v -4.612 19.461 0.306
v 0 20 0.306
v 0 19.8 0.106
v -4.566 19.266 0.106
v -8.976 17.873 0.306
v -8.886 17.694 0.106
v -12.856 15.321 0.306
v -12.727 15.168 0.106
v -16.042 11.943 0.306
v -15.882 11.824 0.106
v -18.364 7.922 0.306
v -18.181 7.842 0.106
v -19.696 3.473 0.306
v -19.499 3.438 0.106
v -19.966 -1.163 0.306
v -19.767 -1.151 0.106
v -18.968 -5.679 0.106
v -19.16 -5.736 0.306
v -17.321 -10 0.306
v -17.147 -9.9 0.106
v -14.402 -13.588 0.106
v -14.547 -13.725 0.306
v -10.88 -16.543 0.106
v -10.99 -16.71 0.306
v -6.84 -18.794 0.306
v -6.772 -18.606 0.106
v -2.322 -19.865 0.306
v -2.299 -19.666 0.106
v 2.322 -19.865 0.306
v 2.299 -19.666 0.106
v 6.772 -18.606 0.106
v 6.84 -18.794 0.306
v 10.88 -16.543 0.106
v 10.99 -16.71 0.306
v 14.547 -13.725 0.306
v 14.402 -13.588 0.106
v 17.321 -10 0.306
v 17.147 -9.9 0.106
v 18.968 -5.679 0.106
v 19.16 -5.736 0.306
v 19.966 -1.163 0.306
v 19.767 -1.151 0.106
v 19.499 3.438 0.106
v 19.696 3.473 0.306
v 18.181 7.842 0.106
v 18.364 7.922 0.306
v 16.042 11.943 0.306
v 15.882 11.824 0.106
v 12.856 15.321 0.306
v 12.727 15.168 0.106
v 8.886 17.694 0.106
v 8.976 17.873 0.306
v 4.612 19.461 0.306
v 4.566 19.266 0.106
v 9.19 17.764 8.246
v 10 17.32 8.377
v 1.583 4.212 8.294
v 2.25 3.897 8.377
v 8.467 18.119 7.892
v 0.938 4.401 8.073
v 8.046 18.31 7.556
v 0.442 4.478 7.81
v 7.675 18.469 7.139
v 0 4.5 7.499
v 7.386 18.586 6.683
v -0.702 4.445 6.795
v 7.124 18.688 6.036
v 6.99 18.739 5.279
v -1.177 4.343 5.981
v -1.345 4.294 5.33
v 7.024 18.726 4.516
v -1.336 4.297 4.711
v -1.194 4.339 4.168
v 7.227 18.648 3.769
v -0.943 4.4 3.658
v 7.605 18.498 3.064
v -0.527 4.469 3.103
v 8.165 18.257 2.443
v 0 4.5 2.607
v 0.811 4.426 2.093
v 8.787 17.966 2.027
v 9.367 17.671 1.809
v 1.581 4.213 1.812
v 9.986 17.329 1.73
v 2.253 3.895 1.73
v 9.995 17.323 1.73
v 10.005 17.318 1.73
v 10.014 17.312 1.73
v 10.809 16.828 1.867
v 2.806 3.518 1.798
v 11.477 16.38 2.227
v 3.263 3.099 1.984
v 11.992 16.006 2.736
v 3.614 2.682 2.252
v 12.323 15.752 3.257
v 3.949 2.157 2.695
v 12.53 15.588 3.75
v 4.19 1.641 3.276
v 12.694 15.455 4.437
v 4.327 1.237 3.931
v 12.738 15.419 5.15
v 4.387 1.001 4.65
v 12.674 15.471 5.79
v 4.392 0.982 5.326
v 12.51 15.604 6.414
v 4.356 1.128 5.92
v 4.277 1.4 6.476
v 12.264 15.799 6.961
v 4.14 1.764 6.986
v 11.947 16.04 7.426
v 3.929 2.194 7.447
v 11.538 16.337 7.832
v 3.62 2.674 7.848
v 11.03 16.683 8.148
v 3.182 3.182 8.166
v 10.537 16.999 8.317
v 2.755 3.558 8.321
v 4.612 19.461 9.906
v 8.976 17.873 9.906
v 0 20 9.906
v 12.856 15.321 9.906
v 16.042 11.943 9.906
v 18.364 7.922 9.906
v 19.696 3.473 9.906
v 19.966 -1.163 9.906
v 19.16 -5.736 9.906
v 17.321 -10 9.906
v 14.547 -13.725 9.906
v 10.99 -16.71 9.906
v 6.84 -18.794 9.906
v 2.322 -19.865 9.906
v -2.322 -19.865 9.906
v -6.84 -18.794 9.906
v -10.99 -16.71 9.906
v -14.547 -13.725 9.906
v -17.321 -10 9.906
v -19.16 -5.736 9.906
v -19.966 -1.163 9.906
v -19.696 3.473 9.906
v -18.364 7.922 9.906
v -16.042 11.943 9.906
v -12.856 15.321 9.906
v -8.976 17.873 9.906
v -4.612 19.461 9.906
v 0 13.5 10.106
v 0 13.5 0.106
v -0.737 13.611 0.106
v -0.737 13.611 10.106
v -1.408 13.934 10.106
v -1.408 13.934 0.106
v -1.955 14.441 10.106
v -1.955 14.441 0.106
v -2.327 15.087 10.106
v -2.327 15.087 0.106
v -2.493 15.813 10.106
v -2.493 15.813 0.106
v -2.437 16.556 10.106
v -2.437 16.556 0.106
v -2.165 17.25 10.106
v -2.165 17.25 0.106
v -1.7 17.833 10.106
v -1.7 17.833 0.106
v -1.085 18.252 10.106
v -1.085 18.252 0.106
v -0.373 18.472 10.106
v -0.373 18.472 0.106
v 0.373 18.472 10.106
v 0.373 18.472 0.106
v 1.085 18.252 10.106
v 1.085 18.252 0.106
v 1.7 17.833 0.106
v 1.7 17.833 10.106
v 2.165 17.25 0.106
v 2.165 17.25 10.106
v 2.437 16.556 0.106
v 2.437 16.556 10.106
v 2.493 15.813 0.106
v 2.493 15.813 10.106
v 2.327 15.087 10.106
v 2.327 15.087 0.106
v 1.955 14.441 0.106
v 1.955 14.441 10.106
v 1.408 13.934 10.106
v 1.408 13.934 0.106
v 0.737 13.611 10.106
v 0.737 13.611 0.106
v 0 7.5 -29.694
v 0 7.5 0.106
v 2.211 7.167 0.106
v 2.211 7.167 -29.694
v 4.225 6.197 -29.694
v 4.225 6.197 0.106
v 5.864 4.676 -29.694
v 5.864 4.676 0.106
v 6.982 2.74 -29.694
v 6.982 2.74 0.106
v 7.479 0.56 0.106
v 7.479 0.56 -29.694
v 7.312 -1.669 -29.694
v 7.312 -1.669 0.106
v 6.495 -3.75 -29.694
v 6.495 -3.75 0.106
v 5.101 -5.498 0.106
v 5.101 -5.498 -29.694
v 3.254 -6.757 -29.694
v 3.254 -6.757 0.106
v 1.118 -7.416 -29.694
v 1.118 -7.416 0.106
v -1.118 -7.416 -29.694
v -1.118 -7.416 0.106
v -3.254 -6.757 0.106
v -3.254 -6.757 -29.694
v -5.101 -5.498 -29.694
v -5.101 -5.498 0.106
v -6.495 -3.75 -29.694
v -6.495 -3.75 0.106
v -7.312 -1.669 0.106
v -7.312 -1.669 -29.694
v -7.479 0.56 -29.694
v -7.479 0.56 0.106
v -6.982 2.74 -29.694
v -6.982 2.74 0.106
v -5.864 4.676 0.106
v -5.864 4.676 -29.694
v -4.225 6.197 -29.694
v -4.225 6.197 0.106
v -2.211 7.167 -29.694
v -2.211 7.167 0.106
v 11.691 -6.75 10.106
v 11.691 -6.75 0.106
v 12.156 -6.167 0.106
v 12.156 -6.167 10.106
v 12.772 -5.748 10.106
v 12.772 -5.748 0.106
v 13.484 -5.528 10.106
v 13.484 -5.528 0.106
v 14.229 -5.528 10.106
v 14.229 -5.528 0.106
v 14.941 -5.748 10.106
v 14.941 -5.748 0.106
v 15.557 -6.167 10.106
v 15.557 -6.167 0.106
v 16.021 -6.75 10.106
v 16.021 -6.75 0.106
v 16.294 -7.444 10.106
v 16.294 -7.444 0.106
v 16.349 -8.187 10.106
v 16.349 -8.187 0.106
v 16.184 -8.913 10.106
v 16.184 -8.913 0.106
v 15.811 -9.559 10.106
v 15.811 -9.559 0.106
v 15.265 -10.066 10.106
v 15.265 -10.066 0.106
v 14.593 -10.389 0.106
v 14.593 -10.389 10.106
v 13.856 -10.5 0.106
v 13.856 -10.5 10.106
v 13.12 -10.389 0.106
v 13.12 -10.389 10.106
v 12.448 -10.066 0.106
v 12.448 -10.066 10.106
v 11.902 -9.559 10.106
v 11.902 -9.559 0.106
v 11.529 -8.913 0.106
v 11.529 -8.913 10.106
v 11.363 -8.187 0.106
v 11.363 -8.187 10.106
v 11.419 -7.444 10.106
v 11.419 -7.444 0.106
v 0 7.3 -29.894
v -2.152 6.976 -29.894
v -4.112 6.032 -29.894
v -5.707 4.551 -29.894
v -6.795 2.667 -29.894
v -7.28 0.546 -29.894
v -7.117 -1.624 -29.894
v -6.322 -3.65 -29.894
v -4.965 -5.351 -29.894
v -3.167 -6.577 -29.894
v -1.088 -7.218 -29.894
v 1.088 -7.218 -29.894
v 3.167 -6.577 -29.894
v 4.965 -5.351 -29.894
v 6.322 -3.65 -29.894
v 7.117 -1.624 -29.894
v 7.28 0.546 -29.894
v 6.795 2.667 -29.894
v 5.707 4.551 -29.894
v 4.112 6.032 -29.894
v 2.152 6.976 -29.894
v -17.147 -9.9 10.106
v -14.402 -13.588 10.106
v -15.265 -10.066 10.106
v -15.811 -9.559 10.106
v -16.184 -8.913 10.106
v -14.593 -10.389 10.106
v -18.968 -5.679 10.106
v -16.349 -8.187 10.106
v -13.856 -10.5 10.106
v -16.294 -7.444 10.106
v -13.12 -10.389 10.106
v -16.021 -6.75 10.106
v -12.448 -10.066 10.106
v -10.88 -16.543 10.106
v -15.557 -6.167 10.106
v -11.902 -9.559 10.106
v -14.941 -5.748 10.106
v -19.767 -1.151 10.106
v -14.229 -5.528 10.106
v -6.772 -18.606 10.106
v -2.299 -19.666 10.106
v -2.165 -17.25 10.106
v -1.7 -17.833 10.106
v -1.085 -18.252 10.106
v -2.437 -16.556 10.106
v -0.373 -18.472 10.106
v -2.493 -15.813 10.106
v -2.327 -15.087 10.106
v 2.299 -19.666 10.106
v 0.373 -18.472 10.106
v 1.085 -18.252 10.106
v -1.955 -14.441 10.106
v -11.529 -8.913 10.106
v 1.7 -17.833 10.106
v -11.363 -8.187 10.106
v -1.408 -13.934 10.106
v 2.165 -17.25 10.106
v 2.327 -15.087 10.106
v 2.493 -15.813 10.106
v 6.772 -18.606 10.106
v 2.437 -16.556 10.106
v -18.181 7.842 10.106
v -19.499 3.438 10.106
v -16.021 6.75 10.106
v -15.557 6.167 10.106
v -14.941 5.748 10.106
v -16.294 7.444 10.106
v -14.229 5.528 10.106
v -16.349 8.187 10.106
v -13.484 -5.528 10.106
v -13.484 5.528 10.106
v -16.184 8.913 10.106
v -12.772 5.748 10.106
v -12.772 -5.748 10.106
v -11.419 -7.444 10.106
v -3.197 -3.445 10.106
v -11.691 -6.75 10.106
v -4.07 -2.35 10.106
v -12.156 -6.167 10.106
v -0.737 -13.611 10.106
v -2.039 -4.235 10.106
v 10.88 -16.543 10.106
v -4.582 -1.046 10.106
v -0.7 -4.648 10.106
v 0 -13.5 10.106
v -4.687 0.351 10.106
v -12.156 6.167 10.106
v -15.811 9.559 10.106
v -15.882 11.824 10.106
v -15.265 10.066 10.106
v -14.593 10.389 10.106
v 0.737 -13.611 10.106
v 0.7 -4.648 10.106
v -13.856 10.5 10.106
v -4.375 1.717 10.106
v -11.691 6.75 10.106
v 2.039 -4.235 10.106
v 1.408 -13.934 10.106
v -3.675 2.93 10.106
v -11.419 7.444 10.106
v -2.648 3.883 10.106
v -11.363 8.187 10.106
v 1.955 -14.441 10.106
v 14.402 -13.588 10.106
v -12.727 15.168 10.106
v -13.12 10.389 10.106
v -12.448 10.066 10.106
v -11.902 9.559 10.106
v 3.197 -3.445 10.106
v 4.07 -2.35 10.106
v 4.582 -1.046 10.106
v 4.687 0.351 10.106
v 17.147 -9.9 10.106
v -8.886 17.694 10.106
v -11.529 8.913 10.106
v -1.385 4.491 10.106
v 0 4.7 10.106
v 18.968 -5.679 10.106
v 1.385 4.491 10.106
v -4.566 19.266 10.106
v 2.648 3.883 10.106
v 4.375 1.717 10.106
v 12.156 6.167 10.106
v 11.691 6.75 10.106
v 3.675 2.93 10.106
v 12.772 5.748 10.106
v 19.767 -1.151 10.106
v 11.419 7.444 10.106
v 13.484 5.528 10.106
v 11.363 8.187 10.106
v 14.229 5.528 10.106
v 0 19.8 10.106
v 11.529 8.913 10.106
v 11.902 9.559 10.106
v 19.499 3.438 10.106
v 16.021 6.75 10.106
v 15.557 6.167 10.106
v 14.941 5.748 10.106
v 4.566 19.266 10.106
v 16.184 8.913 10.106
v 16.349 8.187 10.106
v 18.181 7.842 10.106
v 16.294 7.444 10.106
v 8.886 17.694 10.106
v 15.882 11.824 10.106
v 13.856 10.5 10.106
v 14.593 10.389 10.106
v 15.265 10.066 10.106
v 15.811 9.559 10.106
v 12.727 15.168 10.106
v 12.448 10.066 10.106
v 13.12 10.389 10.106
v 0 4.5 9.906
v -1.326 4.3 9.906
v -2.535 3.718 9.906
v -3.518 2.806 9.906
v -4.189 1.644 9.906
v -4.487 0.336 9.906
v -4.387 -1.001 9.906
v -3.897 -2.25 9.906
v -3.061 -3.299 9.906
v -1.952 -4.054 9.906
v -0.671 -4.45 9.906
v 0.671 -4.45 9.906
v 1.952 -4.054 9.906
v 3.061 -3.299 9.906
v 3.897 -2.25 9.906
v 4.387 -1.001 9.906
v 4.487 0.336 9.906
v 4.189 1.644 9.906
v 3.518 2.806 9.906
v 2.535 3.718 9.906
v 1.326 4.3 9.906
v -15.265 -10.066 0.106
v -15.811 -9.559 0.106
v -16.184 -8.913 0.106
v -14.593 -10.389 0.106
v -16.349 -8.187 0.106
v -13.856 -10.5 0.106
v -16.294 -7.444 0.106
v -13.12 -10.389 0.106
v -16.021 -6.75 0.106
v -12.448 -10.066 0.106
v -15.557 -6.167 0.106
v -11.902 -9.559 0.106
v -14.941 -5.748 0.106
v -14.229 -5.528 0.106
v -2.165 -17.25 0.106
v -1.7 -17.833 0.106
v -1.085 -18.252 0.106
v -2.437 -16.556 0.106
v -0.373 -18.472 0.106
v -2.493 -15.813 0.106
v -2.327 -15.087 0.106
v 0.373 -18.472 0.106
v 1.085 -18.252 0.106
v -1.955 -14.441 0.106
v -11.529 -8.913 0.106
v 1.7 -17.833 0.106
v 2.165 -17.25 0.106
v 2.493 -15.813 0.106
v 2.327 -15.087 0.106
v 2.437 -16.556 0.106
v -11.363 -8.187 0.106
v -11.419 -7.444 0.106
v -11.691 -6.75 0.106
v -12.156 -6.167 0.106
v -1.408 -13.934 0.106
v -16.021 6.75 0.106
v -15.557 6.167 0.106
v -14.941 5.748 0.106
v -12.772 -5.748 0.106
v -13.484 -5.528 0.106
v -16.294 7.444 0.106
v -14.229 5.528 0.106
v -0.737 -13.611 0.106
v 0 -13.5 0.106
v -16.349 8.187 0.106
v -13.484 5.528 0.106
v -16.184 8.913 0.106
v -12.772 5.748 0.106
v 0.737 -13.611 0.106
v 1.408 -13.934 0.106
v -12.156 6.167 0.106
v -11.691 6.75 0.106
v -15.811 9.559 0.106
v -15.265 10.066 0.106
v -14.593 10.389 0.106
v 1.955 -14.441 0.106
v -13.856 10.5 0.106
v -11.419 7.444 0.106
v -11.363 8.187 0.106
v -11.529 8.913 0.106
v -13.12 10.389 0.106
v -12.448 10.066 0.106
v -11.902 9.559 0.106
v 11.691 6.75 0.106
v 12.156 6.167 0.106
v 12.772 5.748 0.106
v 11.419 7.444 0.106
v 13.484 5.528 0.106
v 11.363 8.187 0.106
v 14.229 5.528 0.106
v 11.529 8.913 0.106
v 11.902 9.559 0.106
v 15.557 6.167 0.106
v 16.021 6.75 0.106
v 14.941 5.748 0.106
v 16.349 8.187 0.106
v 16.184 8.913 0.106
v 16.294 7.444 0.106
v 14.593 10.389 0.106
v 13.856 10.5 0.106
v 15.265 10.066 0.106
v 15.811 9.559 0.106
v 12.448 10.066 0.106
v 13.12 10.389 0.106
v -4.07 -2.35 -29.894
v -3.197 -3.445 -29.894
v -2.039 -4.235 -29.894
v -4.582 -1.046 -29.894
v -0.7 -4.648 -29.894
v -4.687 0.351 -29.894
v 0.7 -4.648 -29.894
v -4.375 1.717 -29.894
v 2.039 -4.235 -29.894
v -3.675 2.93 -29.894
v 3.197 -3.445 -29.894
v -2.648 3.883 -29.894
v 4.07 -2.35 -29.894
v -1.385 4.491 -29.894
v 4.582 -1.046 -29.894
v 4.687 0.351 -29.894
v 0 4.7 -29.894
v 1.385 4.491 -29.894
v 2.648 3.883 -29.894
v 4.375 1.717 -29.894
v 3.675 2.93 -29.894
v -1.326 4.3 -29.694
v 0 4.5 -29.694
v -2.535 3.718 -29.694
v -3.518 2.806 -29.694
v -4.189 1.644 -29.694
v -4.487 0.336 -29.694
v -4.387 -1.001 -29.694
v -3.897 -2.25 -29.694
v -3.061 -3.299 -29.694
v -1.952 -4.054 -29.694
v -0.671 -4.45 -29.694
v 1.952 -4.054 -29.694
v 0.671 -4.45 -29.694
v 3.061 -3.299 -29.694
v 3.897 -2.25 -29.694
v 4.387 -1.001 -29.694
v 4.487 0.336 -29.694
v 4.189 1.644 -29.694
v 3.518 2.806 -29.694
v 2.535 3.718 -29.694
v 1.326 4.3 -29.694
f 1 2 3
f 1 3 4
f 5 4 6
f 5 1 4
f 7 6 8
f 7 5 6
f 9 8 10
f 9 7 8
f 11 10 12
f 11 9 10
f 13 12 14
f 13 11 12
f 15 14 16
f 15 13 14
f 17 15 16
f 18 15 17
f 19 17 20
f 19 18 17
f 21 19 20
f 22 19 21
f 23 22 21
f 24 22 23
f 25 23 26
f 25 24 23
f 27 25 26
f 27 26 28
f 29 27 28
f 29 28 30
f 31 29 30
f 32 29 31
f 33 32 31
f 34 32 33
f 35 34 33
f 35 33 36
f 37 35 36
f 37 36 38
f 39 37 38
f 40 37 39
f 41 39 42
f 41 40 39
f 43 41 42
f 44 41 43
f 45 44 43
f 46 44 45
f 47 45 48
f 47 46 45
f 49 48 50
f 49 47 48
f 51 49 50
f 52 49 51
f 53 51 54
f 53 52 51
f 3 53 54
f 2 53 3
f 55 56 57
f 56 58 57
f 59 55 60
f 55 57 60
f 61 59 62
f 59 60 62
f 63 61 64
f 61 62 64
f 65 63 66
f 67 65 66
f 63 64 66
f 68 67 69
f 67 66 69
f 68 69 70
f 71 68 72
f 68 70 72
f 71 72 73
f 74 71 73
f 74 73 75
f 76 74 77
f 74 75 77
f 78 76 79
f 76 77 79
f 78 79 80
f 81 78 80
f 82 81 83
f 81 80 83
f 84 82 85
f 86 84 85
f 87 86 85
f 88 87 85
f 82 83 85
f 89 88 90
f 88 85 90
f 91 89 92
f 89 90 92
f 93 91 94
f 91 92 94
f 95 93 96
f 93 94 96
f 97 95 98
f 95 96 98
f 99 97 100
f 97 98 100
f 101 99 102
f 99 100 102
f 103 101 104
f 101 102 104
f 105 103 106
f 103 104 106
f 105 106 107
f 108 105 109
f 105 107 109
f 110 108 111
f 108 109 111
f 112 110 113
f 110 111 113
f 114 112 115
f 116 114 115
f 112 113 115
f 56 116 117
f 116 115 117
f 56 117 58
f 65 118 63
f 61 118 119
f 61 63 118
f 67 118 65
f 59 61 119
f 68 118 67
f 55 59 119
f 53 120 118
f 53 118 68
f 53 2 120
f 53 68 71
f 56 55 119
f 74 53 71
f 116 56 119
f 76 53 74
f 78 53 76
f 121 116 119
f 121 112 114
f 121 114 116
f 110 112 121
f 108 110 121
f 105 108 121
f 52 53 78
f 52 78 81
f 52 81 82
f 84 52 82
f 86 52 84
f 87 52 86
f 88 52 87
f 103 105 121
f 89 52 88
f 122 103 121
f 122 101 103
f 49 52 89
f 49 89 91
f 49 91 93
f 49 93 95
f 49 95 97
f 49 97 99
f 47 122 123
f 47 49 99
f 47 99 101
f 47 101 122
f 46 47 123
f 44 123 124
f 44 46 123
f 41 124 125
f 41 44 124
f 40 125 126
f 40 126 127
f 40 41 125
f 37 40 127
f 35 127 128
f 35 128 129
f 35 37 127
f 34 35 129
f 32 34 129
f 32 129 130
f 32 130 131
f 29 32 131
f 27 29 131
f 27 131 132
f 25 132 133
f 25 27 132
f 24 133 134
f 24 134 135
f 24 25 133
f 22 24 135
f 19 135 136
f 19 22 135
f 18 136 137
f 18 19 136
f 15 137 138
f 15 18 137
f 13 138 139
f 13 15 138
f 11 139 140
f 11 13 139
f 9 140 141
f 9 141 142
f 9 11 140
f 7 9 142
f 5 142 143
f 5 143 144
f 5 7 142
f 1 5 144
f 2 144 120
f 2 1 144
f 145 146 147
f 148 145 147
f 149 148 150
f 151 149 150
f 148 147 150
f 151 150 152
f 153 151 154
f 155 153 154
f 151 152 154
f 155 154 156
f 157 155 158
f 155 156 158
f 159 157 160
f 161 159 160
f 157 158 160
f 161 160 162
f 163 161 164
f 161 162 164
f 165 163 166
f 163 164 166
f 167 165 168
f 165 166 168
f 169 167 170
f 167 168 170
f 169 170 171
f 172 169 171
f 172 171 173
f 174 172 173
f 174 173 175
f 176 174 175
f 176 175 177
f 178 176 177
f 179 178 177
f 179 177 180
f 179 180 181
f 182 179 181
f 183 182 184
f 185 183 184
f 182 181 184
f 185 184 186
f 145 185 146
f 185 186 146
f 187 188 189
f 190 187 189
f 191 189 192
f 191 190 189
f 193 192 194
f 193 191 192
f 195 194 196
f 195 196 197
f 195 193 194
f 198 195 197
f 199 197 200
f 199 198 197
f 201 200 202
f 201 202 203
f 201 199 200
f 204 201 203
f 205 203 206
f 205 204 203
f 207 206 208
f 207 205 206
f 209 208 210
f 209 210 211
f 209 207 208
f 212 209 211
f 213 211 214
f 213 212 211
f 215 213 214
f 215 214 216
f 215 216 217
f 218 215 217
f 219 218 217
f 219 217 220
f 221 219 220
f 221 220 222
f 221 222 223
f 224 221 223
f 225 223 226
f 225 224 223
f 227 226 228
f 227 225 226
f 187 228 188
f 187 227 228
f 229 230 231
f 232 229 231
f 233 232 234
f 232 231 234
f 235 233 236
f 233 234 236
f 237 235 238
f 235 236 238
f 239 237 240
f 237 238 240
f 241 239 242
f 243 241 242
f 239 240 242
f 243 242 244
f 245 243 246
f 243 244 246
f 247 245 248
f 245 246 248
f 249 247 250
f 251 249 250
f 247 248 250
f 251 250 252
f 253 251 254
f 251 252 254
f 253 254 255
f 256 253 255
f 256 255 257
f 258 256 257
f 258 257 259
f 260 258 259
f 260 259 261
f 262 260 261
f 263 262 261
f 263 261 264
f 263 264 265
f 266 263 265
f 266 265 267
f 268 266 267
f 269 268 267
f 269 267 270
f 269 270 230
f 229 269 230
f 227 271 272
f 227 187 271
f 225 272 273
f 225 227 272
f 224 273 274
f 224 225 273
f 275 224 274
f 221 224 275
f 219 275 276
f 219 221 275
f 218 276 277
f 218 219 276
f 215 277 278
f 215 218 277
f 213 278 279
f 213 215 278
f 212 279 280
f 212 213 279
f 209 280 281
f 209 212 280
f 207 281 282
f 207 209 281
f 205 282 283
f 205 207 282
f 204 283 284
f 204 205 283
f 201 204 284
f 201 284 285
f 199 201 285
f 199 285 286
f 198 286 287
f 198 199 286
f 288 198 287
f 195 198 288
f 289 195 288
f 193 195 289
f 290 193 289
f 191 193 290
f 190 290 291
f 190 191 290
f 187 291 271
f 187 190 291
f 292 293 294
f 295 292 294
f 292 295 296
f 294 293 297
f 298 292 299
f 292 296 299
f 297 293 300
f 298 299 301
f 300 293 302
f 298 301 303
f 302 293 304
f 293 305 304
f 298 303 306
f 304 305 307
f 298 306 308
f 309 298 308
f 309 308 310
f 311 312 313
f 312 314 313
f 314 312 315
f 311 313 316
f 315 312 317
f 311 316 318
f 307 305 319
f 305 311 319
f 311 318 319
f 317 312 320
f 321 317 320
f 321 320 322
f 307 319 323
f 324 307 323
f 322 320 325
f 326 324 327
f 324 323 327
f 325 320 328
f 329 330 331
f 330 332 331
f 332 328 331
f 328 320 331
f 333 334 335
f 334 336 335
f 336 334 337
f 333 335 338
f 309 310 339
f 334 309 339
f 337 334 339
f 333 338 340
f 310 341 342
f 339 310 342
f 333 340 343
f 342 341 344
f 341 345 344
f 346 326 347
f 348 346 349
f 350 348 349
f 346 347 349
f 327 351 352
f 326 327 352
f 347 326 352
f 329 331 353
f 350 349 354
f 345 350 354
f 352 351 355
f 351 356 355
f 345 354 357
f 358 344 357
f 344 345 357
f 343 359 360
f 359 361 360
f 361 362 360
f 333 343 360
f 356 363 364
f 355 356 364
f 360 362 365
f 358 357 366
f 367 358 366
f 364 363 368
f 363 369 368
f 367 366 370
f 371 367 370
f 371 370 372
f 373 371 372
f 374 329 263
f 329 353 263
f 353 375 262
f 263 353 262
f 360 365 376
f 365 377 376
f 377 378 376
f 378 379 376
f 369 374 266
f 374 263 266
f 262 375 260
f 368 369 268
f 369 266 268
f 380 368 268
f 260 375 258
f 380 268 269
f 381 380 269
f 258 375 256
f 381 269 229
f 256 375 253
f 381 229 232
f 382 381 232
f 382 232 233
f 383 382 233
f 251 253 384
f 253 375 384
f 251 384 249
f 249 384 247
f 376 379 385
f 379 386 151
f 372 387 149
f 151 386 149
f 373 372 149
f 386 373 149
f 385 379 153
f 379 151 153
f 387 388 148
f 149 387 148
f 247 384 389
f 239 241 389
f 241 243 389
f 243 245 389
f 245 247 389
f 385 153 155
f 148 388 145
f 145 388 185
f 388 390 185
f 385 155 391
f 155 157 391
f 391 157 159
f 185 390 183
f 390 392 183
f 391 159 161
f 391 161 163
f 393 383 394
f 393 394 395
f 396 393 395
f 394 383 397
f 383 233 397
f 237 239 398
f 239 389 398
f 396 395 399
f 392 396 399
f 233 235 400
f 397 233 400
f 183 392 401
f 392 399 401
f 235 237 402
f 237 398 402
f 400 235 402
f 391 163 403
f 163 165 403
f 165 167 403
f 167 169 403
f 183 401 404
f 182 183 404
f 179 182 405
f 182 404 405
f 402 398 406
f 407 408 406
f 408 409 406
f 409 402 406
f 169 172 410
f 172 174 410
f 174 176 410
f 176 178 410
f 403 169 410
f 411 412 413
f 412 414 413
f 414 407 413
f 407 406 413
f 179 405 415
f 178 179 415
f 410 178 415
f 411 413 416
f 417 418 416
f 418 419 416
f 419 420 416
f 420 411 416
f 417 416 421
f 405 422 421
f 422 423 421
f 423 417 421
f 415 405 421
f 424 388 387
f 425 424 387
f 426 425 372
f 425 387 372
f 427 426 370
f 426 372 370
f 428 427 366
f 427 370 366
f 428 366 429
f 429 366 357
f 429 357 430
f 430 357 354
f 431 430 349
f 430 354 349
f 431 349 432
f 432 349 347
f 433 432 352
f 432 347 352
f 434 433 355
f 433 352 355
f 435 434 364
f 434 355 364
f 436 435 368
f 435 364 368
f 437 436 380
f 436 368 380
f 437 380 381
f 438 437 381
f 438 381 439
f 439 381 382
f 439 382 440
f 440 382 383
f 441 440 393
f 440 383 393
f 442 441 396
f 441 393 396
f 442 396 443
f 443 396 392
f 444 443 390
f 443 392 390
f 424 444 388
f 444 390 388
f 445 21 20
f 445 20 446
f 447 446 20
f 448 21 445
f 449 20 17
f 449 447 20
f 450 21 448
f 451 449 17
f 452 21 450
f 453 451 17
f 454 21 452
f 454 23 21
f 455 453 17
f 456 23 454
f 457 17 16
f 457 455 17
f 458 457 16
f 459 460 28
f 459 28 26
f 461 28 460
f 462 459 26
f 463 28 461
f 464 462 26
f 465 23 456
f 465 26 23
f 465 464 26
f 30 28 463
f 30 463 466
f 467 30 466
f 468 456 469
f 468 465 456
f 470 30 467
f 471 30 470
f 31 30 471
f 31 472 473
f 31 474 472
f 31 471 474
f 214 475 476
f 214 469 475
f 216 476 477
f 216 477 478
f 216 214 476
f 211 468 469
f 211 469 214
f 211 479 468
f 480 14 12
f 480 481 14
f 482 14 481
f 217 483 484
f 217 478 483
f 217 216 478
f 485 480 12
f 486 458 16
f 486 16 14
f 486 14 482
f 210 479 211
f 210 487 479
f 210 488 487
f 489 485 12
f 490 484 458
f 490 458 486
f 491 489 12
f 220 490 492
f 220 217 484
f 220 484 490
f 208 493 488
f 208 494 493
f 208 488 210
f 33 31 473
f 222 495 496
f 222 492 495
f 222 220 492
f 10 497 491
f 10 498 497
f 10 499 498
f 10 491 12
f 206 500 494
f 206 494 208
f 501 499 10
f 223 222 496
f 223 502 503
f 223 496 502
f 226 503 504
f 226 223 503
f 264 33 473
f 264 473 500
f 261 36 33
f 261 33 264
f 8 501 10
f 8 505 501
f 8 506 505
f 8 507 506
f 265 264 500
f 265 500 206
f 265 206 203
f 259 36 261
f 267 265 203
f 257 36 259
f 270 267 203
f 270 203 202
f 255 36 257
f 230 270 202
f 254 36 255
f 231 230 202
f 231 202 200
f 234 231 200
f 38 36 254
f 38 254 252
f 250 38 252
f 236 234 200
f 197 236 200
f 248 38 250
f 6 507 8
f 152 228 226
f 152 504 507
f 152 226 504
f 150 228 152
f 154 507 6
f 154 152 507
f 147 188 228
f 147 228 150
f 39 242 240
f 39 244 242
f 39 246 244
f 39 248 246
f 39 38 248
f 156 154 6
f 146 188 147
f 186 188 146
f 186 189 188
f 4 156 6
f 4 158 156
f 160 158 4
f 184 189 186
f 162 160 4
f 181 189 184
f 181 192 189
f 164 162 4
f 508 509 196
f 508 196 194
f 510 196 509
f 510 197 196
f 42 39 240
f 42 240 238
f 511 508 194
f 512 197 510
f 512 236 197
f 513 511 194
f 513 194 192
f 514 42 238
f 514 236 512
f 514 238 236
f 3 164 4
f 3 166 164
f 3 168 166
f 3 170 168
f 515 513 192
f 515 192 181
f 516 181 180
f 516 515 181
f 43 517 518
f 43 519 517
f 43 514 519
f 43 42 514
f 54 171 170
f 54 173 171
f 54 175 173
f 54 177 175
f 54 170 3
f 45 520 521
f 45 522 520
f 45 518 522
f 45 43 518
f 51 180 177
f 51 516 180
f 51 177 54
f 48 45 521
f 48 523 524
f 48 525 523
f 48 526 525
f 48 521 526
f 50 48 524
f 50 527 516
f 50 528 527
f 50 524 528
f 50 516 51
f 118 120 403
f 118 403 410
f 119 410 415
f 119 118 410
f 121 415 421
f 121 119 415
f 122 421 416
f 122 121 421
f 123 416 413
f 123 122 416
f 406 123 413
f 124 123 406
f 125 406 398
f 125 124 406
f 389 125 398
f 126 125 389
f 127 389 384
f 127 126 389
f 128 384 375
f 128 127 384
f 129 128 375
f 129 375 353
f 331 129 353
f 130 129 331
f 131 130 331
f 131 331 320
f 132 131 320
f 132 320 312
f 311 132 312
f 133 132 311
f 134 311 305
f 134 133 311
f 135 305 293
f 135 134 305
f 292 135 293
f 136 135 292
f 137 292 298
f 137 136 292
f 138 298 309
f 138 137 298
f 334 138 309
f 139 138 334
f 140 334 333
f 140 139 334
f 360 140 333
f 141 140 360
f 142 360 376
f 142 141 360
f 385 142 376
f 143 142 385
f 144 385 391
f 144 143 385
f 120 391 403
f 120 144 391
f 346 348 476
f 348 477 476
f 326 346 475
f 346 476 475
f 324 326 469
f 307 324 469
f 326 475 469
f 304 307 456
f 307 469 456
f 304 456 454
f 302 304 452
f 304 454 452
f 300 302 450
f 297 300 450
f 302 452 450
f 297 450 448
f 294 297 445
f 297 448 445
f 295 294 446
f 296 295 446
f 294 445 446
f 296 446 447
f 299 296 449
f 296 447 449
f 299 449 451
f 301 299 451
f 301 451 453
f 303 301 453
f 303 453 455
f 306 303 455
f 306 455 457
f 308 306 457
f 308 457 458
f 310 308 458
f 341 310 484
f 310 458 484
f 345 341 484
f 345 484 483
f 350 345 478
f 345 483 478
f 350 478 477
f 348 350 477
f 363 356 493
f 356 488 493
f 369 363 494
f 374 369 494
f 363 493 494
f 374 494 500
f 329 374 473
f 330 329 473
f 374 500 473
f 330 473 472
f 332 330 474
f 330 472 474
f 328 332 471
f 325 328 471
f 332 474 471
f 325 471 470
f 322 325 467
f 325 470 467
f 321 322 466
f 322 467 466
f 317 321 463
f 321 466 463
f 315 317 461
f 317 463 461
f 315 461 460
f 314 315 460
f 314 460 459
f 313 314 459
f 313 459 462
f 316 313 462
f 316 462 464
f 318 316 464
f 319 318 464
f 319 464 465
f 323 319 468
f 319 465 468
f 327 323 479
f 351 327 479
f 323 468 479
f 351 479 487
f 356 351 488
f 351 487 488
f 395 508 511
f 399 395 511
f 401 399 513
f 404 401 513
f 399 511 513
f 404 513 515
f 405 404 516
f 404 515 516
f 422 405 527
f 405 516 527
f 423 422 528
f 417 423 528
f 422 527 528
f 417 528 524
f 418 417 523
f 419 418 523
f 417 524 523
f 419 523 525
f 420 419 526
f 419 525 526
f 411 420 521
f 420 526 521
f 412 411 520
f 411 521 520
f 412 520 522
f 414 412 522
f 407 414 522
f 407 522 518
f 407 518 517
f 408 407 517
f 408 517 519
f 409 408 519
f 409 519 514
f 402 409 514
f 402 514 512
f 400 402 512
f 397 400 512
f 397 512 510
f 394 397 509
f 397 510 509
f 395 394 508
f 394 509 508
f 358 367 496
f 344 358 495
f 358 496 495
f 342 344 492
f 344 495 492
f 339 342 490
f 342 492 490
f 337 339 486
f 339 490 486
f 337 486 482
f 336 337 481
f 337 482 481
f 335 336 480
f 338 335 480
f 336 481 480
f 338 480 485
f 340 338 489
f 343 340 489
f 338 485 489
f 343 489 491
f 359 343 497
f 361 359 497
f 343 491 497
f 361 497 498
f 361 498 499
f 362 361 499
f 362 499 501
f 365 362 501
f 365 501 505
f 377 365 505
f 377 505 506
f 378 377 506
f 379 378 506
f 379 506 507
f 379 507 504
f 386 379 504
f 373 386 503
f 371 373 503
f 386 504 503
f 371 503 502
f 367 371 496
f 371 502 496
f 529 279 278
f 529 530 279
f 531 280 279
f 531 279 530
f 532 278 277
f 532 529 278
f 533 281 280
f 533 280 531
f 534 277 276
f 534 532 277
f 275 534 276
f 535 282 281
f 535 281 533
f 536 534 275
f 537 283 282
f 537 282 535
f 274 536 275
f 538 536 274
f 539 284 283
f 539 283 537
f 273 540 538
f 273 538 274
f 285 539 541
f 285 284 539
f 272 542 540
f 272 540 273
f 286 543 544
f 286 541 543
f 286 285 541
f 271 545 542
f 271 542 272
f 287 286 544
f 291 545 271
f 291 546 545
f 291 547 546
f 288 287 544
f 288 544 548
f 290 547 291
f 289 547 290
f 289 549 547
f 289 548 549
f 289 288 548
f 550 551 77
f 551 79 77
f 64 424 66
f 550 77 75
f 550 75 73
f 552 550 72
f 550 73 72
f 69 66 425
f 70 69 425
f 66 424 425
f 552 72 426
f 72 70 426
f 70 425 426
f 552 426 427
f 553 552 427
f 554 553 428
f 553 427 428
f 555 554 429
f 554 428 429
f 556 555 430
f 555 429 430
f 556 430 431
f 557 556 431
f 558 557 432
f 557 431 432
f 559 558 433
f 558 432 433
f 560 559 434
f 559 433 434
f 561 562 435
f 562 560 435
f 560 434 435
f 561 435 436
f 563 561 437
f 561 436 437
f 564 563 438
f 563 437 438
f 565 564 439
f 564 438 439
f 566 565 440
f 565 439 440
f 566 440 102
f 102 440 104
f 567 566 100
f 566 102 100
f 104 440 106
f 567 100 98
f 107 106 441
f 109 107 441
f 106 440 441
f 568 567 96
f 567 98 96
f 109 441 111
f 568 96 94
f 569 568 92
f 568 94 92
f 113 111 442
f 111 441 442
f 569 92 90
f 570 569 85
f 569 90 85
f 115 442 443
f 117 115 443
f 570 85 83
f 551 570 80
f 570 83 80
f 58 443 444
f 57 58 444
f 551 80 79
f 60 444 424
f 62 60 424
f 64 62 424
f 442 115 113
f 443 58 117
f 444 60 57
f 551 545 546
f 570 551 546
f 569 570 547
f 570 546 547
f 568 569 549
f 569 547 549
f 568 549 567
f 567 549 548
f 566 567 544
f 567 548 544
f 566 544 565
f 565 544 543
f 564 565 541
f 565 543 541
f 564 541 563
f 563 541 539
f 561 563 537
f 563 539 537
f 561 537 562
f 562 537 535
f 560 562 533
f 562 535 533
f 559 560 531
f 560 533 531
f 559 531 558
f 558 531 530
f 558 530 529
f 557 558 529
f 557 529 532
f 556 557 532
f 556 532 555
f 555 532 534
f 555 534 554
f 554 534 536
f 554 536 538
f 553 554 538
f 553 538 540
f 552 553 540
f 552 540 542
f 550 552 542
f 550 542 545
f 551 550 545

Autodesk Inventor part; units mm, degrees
ref_plane "XZ Plane" through (0, 0, 0) normal (0, 1, 0) x (-1, 0, 0)
ref_plane "XY Plane" through (0, 0, 0) normal (0, 0, 1) x (1, 0, 0)
sketch "Sketch1" plane through (0, 0, 0) normal (1, 0, 0) x (0, 1, 0)
  line L0 (0, 0) -> (0, -33.1818)
  line L1 (4.5, 10.1062) -> (20, 10.1062)
  line L2 (20, 10.1062) -> (20, 0.1062)
  line L3 (20, 0.1062) -> (7.5, 0.1062)
  line L4 (7.5, 0.1062) -> (7.5, -29.8938)
  line L5 (7.5, -29.8938) -> (4.5, -29.8938)
  line L6 (4.5, -29.8938) -> (4.5, 10.1062)
  dimension "d0" = 9
  dimension "d1" = 15
  dimension "d2" = 30
  dimension "d3" = 10
  dimension "d4" = 40
revolve "Revolution1" add sketch "Sketch1" angle 360 about axis through (0, 0, 0) along (0, 0, -1)
sketch "Sketch2" plane through (0, 0, 10.1062) normal (0, 0, 1) x (1, 0, 0)
  point P0 (0, 0)
  point P1 (0, 16)
  dimension "d6" = 16
hole "Hole1" at (0, 16, 10.1062) direction (0, 0, -1) diameter 5 end through all
pattern_circular "Circular Pattern1" count 6 over 360 about axis through (0, 0, 5.1062) along (0, 0, -1) of "Hole1"
ref_plane "Work Plane2" through (10, 17.3205, 5.1062) normal (0.5, 0.866, 0) x (-0.866, 0.5, 0)
ref_plane "Work Plane1" through (0, 0, 0) normal (0.5, 0.866, 0) x (0, 0, 1)
sketch "Sketch3" plane through (10, 17.3205, 5.1062) normal (0.5, 0.866, 0) x (-0.866, 0.5, 0)
  line L0 (-20, 5) -> (20, 5) projected
  line L1 (-20, -5) -> (20, -5) projected
  line L2 (0, 5) -> (0, -5.1062)
  point P0 (0, -0.0531)
hole "Hole2" at (10, 17.3205, 5.0531) direction (-0.5, -0.866, 0) diameter 6.647 depth 20.2 tip angle 118 thread size "M8x1.25" class "6H" standard "ANSI Metric M Profile"
chamfer "Chamfer1" distance 0.2 angle 45 5 edges at (0, -20, 0.1062) (0, -20, 10.1062) (0, -4.5, 10.1062) (0, -4.5, -29.8938) (0, -7.5, -29.8938)
properties part number "CopperElectrode" material "Copper"
